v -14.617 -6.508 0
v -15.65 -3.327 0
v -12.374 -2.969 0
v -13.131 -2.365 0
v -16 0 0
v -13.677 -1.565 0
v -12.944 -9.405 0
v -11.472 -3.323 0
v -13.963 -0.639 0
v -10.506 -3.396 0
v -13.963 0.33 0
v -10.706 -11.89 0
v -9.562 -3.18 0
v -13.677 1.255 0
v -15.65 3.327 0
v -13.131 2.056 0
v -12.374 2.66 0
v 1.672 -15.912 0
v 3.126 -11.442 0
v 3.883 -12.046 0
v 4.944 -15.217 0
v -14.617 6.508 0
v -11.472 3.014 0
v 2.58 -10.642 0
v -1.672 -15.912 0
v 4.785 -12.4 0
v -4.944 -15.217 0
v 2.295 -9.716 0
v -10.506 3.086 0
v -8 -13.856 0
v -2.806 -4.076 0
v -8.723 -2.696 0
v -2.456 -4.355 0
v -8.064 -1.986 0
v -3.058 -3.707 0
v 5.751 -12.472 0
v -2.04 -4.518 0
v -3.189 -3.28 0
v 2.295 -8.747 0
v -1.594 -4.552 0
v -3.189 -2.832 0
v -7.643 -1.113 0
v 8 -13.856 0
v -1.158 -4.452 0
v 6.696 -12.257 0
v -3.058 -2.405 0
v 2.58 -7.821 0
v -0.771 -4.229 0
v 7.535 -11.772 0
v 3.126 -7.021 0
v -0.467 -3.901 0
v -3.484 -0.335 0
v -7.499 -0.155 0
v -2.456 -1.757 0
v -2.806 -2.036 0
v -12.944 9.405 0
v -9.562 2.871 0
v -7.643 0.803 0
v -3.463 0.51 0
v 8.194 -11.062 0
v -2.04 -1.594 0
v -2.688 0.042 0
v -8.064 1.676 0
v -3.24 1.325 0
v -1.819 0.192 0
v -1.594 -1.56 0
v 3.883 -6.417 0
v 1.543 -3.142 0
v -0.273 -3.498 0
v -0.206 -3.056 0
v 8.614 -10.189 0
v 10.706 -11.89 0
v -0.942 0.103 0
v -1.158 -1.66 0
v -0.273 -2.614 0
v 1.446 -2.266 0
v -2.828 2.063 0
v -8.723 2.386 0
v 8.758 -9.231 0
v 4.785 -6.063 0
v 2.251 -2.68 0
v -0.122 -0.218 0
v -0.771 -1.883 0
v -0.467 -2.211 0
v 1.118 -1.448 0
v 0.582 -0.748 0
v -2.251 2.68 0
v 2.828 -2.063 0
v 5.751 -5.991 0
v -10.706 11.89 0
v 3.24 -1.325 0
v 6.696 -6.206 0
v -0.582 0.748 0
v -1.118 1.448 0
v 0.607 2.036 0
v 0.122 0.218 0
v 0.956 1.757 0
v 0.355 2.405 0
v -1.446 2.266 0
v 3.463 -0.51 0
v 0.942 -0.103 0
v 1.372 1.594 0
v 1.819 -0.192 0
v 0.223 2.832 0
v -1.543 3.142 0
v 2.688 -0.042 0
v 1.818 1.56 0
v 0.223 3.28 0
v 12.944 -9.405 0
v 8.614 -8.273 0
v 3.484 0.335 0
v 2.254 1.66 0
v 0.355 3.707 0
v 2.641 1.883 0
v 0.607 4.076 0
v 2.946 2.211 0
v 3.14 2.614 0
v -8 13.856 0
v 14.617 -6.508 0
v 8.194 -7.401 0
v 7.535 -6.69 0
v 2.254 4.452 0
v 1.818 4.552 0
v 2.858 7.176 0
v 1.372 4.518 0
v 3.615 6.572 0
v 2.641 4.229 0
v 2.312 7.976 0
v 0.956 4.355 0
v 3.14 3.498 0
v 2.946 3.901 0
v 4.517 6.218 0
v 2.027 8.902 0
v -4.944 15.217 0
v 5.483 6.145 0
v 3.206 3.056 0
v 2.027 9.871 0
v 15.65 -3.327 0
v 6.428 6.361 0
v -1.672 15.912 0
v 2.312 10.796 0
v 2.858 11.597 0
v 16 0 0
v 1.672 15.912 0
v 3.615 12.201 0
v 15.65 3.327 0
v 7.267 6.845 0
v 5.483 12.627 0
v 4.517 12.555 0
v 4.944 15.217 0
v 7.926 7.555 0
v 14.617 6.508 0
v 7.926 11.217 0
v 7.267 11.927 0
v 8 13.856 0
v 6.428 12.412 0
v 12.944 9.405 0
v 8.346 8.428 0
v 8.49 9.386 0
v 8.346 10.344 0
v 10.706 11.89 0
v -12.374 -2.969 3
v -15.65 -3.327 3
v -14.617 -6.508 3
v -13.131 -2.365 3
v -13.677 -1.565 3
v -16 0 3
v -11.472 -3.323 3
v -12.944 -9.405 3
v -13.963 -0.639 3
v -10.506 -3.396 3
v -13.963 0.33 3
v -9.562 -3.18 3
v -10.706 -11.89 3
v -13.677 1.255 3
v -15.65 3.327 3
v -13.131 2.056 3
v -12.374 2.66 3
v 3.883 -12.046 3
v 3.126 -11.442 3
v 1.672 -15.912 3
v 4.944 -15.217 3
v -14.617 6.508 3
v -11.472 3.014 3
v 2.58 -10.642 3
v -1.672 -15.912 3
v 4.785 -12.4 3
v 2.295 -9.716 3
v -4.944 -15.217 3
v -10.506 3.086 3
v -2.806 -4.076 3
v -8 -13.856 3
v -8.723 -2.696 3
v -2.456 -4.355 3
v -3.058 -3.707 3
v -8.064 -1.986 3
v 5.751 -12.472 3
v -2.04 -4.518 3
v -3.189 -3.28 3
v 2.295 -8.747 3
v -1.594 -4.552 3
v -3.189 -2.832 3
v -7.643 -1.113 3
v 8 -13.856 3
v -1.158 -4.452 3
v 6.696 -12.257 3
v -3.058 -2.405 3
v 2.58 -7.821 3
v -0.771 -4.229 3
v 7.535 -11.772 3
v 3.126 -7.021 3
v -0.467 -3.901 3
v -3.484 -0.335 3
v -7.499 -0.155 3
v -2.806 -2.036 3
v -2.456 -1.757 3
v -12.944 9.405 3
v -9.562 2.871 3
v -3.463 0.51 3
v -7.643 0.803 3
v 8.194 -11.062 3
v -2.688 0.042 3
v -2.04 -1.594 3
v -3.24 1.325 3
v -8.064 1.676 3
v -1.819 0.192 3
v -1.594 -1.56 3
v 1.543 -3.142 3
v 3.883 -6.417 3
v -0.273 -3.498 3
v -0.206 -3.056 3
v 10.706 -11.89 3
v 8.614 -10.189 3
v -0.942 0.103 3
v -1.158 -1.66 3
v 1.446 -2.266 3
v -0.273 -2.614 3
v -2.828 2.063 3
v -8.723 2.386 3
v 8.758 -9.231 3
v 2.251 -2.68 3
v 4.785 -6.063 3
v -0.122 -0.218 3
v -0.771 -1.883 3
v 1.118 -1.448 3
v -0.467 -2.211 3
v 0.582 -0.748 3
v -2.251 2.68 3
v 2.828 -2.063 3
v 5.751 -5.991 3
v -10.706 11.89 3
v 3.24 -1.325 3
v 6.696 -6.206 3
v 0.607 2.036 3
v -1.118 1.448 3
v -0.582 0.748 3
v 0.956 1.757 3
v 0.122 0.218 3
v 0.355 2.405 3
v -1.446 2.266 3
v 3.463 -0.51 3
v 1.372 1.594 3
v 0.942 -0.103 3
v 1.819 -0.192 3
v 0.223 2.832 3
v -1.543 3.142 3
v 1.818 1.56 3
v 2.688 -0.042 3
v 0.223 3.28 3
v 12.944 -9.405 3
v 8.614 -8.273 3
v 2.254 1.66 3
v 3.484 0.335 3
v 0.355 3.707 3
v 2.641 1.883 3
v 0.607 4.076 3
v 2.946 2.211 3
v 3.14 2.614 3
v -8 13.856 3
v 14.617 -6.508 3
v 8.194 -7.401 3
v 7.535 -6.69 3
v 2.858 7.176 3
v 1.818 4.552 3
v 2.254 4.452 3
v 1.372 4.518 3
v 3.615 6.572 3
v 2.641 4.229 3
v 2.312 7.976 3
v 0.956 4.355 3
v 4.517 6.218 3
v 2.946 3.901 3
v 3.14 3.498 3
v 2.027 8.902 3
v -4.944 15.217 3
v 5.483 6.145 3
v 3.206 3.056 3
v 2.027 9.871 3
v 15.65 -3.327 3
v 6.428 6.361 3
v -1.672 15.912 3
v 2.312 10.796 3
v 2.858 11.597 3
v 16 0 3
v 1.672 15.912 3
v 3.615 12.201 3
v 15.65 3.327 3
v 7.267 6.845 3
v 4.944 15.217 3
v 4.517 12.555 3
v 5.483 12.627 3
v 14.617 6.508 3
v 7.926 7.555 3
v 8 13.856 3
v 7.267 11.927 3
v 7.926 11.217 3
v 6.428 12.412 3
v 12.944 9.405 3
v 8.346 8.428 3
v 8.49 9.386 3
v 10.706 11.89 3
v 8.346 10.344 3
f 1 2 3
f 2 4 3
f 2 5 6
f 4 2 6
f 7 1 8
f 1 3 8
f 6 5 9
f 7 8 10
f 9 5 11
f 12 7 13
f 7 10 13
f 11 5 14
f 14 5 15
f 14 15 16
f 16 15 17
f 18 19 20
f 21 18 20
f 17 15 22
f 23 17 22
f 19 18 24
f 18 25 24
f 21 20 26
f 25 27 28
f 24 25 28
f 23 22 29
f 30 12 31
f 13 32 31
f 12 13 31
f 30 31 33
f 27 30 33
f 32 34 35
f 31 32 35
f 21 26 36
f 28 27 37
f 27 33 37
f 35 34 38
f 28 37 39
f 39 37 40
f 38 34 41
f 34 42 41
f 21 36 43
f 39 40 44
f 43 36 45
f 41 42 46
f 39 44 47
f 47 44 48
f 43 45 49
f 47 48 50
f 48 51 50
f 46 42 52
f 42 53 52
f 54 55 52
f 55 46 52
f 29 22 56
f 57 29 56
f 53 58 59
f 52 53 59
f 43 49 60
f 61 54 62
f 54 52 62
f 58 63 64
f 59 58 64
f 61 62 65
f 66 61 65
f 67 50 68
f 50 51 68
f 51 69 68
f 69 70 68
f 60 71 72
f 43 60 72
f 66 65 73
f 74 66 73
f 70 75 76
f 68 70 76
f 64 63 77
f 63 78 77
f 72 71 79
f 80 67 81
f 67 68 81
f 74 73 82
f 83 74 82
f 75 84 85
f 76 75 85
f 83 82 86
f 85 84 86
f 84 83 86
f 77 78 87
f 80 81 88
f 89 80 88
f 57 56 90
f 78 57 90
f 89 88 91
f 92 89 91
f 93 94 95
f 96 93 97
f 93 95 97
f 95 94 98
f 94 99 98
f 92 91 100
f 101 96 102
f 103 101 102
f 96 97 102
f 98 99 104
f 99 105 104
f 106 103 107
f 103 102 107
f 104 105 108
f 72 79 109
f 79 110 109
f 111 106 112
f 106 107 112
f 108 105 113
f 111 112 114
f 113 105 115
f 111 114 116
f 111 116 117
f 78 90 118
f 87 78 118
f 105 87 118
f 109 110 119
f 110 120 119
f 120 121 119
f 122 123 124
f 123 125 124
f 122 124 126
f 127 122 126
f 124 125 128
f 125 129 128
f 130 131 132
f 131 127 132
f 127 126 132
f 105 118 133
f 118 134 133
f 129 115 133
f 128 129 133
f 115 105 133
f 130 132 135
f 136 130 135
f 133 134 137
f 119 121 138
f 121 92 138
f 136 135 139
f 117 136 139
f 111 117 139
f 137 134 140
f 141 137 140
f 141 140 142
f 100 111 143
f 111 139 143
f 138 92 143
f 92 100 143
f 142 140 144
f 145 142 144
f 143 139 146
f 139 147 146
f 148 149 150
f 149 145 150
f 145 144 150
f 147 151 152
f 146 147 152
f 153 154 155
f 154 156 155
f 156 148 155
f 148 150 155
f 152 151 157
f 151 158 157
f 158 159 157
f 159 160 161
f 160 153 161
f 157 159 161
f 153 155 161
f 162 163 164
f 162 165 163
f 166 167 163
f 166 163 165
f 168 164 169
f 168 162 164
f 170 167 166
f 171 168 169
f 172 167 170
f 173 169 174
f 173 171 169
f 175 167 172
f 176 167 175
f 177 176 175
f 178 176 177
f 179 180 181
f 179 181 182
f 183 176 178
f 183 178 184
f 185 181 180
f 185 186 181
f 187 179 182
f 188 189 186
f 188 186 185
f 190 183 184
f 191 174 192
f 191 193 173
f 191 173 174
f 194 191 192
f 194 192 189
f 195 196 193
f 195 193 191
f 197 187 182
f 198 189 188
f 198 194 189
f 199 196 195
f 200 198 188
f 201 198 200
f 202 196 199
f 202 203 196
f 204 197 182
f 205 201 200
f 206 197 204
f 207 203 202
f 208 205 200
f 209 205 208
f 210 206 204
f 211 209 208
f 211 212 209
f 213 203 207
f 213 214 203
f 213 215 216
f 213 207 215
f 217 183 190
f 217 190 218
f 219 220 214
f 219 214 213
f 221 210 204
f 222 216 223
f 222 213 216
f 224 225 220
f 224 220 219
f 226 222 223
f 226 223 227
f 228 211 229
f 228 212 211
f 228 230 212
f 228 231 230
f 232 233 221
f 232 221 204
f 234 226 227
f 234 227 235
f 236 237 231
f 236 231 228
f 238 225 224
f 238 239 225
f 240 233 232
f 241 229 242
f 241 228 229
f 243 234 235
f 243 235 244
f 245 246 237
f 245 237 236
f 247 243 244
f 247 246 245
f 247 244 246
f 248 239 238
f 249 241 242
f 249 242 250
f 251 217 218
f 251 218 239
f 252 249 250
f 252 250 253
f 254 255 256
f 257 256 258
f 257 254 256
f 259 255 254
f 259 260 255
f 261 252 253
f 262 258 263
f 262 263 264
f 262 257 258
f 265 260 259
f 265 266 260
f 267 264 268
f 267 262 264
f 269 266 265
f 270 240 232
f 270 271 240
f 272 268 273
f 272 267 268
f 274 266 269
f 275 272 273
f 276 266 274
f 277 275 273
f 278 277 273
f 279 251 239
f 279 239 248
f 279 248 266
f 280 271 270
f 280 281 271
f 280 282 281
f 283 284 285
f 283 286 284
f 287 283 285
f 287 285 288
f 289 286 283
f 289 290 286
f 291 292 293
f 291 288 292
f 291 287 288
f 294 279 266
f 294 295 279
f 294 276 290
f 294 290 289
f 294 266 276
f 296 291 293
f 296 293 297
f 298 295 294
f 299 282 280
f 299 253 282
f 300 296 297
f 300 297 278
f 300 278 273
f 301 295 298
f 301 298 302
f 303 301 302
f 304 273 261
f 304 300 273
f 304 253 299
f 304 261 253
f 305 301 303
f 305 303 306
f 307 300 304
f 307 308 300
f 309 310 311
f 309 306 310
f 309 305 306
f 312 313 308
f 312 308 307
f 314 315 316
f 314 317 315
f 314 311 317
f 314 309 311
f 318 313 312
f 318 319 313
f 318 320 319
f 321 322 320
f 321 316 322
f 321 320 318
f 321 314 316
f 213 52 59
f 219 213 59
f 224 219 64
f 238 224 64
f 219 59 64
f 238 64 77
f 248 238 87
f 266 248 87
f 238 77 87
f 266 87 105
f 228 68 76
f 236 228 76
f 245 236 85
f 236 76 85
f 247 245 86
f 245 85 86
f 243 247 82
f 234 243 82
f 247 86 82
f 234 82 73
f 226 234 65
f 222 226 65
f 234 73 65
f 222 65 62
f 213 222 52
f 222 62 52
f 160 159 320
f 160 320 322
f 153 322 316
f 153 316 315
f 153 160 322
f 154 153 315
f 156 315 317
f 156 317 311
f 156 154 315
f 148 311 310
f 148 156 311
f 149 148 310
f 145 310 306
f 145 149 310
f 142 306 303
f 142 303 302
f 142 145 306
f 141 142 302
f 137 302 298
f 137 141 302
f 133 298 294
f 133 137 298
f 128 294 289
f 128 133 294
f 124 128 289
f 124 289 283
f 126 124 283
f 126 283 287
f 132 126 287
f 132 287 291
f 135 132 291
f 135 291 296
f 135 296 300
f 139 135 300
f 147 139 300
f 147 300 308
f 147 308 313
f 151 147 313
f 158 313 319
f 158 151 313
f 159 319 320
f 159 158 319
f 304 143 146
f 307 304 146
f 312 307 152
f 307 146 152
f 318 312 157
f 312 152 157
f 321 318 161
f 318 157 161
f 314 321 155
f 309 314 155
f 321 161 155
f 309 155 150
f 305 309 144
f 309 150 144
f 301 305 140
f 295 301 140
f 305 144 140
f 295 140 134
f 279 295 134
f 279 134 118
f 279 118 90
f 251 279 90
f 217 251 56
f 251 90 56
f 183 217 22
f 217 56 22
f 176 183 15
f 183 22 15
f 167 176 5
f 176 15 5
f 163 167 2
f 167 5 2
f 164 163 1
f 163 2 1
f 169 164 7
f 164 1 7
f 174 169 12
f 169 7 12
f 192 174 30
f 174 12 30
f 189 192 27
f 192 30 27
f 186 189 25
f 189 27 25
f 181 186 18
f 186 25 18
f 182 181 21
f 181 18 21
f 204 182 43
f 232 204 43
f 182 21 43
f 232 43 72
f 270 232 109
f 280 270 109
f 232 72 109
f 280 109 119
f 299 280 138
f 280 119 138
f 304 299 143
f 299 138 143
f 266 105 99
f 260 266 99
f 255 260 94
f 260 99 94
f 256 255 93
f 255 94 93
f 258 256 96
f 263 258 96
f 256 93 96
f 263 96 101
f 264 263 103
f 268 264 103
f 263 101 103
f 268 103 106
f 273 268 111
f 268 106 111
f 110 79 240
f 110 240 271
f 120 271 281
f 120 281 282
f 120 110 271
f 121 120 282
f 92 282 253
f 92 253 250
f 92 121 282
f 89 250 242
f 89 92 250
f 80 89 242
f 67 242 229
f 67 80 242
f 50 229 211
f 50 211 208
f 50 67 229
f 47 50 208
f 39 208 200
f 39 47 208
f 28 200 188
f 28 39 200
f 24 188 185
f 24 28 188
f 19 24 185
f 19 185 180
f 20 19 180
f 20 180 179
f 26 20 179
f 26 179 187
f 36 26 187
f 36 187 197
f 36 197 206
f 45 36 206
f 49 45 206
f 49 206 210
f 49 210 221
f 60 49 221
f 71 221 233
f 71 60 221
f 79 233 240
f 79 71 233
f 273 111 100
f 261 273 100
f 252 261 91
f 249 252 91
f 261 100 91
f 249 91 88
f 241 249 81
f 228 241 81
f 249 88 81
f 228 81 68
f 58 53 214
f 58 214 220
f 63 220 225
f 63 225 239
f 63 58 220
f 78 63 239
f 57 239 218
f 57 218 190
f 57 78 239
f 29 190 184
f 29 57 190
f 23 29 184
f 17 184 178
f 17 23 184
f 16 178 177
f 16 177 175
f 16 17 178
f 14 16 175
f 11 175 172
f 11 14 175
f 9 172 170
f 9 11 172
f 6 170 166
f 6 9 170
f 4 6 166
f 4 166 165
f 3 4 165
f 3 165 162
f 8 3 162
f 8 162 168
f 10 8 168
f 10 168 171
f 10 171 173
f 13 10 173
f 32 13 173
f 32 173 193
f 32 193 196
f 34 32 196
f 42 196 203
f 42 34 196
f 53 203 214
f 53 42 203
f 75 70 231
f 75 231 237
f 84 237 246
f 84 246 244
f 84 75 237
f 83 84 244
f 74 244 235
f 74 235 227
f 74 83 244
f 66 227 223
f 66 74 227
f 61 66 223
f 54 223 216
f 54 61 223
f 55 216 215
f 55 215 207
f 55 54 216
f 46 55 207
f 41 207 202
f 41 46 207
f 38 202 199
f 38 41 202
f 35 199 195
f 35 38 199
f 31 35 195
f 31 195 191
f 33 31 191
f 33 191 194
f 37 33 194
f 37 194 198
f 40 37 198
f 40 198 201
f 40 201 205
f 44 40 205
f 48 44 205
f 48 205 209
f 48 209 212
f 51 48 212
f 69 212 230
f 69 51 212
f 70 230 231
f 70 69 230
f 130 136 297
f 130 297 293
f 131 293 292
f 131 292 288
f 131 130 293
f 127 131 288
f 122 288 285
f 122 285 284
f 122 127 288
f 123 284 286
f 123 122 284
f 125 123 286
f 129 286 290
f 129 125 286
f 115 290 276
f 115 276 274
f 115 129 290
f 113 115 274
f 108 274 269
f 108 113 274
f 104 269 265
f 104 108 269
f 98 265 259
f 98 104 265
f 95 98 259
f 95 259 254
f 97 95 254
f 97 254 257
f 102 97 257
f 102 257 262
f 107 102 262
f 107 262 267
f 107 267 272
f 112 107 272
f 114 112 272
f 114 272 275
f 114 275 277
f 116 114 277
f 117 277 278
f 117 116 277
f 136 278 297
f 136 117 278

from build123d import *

# Parameters (mm, degrees)
ESQUISSE1_R        = 16
ESQUISSE1_R_2      = 3.25
ESQUISSE1_R_3      = 1.5
BOSS_EXTRU_1_DEPTH = 3


with BuildPart() as part:
    # Esquisse1 → Boss.-Extru.1 (new body)
    with BuildSketch(Plane.XY):
        Circle(ESQUISSE1_R)
        with Locations((5.508433282, -9.231449657)):
            Circle(ESQUISSE1_R_2, mode=Mode.SUBTRACT)
        with Locations((-10.748886558, -0.154718329)):
            Circle(ESQUISSE1_R_2, mode=Mode.SUBTRACT)
        with Locations((5.240453276, 9.386167986)):
            Circle(ESQUISSE1_R_2, mode=Mode.SUBTRACT)
        with Locations((1.70619409, 3.05596167)):
            Circle(ESQUISSE1_R_3, mode=Mode.SUBTRACT)
        with Locations((-1.70619409, -3.05596167)):
            Circle(ESQUISSE1_R_3, mode=Mode.SUBTRACT)
        with BuildLine():
            ThreePointArc((-1.54267531, 3.141679947), (0.121871006, 0.218282976), (3.483906341, 0.335256035))
            ThreePointArc((3.483906341, 0.335256035), (3.05596167, -1.70619409), (1.54267531, -3.141679947))
            ThreePointArc((1.54267531, -3.141679947), (-0.121871006, -0.218282976), (-3.483906341, -0.335256035))
            ThreePointArc((-3.483906341, -0.335256035), (-3.05596167, 1.70619409), (-1.54267531, 3.141679947))
        make_face(mode=Mode.SUBTRACT)
    extrude(amount=BOSS_EXTRU_1_DEPTH)


solid = part.part
